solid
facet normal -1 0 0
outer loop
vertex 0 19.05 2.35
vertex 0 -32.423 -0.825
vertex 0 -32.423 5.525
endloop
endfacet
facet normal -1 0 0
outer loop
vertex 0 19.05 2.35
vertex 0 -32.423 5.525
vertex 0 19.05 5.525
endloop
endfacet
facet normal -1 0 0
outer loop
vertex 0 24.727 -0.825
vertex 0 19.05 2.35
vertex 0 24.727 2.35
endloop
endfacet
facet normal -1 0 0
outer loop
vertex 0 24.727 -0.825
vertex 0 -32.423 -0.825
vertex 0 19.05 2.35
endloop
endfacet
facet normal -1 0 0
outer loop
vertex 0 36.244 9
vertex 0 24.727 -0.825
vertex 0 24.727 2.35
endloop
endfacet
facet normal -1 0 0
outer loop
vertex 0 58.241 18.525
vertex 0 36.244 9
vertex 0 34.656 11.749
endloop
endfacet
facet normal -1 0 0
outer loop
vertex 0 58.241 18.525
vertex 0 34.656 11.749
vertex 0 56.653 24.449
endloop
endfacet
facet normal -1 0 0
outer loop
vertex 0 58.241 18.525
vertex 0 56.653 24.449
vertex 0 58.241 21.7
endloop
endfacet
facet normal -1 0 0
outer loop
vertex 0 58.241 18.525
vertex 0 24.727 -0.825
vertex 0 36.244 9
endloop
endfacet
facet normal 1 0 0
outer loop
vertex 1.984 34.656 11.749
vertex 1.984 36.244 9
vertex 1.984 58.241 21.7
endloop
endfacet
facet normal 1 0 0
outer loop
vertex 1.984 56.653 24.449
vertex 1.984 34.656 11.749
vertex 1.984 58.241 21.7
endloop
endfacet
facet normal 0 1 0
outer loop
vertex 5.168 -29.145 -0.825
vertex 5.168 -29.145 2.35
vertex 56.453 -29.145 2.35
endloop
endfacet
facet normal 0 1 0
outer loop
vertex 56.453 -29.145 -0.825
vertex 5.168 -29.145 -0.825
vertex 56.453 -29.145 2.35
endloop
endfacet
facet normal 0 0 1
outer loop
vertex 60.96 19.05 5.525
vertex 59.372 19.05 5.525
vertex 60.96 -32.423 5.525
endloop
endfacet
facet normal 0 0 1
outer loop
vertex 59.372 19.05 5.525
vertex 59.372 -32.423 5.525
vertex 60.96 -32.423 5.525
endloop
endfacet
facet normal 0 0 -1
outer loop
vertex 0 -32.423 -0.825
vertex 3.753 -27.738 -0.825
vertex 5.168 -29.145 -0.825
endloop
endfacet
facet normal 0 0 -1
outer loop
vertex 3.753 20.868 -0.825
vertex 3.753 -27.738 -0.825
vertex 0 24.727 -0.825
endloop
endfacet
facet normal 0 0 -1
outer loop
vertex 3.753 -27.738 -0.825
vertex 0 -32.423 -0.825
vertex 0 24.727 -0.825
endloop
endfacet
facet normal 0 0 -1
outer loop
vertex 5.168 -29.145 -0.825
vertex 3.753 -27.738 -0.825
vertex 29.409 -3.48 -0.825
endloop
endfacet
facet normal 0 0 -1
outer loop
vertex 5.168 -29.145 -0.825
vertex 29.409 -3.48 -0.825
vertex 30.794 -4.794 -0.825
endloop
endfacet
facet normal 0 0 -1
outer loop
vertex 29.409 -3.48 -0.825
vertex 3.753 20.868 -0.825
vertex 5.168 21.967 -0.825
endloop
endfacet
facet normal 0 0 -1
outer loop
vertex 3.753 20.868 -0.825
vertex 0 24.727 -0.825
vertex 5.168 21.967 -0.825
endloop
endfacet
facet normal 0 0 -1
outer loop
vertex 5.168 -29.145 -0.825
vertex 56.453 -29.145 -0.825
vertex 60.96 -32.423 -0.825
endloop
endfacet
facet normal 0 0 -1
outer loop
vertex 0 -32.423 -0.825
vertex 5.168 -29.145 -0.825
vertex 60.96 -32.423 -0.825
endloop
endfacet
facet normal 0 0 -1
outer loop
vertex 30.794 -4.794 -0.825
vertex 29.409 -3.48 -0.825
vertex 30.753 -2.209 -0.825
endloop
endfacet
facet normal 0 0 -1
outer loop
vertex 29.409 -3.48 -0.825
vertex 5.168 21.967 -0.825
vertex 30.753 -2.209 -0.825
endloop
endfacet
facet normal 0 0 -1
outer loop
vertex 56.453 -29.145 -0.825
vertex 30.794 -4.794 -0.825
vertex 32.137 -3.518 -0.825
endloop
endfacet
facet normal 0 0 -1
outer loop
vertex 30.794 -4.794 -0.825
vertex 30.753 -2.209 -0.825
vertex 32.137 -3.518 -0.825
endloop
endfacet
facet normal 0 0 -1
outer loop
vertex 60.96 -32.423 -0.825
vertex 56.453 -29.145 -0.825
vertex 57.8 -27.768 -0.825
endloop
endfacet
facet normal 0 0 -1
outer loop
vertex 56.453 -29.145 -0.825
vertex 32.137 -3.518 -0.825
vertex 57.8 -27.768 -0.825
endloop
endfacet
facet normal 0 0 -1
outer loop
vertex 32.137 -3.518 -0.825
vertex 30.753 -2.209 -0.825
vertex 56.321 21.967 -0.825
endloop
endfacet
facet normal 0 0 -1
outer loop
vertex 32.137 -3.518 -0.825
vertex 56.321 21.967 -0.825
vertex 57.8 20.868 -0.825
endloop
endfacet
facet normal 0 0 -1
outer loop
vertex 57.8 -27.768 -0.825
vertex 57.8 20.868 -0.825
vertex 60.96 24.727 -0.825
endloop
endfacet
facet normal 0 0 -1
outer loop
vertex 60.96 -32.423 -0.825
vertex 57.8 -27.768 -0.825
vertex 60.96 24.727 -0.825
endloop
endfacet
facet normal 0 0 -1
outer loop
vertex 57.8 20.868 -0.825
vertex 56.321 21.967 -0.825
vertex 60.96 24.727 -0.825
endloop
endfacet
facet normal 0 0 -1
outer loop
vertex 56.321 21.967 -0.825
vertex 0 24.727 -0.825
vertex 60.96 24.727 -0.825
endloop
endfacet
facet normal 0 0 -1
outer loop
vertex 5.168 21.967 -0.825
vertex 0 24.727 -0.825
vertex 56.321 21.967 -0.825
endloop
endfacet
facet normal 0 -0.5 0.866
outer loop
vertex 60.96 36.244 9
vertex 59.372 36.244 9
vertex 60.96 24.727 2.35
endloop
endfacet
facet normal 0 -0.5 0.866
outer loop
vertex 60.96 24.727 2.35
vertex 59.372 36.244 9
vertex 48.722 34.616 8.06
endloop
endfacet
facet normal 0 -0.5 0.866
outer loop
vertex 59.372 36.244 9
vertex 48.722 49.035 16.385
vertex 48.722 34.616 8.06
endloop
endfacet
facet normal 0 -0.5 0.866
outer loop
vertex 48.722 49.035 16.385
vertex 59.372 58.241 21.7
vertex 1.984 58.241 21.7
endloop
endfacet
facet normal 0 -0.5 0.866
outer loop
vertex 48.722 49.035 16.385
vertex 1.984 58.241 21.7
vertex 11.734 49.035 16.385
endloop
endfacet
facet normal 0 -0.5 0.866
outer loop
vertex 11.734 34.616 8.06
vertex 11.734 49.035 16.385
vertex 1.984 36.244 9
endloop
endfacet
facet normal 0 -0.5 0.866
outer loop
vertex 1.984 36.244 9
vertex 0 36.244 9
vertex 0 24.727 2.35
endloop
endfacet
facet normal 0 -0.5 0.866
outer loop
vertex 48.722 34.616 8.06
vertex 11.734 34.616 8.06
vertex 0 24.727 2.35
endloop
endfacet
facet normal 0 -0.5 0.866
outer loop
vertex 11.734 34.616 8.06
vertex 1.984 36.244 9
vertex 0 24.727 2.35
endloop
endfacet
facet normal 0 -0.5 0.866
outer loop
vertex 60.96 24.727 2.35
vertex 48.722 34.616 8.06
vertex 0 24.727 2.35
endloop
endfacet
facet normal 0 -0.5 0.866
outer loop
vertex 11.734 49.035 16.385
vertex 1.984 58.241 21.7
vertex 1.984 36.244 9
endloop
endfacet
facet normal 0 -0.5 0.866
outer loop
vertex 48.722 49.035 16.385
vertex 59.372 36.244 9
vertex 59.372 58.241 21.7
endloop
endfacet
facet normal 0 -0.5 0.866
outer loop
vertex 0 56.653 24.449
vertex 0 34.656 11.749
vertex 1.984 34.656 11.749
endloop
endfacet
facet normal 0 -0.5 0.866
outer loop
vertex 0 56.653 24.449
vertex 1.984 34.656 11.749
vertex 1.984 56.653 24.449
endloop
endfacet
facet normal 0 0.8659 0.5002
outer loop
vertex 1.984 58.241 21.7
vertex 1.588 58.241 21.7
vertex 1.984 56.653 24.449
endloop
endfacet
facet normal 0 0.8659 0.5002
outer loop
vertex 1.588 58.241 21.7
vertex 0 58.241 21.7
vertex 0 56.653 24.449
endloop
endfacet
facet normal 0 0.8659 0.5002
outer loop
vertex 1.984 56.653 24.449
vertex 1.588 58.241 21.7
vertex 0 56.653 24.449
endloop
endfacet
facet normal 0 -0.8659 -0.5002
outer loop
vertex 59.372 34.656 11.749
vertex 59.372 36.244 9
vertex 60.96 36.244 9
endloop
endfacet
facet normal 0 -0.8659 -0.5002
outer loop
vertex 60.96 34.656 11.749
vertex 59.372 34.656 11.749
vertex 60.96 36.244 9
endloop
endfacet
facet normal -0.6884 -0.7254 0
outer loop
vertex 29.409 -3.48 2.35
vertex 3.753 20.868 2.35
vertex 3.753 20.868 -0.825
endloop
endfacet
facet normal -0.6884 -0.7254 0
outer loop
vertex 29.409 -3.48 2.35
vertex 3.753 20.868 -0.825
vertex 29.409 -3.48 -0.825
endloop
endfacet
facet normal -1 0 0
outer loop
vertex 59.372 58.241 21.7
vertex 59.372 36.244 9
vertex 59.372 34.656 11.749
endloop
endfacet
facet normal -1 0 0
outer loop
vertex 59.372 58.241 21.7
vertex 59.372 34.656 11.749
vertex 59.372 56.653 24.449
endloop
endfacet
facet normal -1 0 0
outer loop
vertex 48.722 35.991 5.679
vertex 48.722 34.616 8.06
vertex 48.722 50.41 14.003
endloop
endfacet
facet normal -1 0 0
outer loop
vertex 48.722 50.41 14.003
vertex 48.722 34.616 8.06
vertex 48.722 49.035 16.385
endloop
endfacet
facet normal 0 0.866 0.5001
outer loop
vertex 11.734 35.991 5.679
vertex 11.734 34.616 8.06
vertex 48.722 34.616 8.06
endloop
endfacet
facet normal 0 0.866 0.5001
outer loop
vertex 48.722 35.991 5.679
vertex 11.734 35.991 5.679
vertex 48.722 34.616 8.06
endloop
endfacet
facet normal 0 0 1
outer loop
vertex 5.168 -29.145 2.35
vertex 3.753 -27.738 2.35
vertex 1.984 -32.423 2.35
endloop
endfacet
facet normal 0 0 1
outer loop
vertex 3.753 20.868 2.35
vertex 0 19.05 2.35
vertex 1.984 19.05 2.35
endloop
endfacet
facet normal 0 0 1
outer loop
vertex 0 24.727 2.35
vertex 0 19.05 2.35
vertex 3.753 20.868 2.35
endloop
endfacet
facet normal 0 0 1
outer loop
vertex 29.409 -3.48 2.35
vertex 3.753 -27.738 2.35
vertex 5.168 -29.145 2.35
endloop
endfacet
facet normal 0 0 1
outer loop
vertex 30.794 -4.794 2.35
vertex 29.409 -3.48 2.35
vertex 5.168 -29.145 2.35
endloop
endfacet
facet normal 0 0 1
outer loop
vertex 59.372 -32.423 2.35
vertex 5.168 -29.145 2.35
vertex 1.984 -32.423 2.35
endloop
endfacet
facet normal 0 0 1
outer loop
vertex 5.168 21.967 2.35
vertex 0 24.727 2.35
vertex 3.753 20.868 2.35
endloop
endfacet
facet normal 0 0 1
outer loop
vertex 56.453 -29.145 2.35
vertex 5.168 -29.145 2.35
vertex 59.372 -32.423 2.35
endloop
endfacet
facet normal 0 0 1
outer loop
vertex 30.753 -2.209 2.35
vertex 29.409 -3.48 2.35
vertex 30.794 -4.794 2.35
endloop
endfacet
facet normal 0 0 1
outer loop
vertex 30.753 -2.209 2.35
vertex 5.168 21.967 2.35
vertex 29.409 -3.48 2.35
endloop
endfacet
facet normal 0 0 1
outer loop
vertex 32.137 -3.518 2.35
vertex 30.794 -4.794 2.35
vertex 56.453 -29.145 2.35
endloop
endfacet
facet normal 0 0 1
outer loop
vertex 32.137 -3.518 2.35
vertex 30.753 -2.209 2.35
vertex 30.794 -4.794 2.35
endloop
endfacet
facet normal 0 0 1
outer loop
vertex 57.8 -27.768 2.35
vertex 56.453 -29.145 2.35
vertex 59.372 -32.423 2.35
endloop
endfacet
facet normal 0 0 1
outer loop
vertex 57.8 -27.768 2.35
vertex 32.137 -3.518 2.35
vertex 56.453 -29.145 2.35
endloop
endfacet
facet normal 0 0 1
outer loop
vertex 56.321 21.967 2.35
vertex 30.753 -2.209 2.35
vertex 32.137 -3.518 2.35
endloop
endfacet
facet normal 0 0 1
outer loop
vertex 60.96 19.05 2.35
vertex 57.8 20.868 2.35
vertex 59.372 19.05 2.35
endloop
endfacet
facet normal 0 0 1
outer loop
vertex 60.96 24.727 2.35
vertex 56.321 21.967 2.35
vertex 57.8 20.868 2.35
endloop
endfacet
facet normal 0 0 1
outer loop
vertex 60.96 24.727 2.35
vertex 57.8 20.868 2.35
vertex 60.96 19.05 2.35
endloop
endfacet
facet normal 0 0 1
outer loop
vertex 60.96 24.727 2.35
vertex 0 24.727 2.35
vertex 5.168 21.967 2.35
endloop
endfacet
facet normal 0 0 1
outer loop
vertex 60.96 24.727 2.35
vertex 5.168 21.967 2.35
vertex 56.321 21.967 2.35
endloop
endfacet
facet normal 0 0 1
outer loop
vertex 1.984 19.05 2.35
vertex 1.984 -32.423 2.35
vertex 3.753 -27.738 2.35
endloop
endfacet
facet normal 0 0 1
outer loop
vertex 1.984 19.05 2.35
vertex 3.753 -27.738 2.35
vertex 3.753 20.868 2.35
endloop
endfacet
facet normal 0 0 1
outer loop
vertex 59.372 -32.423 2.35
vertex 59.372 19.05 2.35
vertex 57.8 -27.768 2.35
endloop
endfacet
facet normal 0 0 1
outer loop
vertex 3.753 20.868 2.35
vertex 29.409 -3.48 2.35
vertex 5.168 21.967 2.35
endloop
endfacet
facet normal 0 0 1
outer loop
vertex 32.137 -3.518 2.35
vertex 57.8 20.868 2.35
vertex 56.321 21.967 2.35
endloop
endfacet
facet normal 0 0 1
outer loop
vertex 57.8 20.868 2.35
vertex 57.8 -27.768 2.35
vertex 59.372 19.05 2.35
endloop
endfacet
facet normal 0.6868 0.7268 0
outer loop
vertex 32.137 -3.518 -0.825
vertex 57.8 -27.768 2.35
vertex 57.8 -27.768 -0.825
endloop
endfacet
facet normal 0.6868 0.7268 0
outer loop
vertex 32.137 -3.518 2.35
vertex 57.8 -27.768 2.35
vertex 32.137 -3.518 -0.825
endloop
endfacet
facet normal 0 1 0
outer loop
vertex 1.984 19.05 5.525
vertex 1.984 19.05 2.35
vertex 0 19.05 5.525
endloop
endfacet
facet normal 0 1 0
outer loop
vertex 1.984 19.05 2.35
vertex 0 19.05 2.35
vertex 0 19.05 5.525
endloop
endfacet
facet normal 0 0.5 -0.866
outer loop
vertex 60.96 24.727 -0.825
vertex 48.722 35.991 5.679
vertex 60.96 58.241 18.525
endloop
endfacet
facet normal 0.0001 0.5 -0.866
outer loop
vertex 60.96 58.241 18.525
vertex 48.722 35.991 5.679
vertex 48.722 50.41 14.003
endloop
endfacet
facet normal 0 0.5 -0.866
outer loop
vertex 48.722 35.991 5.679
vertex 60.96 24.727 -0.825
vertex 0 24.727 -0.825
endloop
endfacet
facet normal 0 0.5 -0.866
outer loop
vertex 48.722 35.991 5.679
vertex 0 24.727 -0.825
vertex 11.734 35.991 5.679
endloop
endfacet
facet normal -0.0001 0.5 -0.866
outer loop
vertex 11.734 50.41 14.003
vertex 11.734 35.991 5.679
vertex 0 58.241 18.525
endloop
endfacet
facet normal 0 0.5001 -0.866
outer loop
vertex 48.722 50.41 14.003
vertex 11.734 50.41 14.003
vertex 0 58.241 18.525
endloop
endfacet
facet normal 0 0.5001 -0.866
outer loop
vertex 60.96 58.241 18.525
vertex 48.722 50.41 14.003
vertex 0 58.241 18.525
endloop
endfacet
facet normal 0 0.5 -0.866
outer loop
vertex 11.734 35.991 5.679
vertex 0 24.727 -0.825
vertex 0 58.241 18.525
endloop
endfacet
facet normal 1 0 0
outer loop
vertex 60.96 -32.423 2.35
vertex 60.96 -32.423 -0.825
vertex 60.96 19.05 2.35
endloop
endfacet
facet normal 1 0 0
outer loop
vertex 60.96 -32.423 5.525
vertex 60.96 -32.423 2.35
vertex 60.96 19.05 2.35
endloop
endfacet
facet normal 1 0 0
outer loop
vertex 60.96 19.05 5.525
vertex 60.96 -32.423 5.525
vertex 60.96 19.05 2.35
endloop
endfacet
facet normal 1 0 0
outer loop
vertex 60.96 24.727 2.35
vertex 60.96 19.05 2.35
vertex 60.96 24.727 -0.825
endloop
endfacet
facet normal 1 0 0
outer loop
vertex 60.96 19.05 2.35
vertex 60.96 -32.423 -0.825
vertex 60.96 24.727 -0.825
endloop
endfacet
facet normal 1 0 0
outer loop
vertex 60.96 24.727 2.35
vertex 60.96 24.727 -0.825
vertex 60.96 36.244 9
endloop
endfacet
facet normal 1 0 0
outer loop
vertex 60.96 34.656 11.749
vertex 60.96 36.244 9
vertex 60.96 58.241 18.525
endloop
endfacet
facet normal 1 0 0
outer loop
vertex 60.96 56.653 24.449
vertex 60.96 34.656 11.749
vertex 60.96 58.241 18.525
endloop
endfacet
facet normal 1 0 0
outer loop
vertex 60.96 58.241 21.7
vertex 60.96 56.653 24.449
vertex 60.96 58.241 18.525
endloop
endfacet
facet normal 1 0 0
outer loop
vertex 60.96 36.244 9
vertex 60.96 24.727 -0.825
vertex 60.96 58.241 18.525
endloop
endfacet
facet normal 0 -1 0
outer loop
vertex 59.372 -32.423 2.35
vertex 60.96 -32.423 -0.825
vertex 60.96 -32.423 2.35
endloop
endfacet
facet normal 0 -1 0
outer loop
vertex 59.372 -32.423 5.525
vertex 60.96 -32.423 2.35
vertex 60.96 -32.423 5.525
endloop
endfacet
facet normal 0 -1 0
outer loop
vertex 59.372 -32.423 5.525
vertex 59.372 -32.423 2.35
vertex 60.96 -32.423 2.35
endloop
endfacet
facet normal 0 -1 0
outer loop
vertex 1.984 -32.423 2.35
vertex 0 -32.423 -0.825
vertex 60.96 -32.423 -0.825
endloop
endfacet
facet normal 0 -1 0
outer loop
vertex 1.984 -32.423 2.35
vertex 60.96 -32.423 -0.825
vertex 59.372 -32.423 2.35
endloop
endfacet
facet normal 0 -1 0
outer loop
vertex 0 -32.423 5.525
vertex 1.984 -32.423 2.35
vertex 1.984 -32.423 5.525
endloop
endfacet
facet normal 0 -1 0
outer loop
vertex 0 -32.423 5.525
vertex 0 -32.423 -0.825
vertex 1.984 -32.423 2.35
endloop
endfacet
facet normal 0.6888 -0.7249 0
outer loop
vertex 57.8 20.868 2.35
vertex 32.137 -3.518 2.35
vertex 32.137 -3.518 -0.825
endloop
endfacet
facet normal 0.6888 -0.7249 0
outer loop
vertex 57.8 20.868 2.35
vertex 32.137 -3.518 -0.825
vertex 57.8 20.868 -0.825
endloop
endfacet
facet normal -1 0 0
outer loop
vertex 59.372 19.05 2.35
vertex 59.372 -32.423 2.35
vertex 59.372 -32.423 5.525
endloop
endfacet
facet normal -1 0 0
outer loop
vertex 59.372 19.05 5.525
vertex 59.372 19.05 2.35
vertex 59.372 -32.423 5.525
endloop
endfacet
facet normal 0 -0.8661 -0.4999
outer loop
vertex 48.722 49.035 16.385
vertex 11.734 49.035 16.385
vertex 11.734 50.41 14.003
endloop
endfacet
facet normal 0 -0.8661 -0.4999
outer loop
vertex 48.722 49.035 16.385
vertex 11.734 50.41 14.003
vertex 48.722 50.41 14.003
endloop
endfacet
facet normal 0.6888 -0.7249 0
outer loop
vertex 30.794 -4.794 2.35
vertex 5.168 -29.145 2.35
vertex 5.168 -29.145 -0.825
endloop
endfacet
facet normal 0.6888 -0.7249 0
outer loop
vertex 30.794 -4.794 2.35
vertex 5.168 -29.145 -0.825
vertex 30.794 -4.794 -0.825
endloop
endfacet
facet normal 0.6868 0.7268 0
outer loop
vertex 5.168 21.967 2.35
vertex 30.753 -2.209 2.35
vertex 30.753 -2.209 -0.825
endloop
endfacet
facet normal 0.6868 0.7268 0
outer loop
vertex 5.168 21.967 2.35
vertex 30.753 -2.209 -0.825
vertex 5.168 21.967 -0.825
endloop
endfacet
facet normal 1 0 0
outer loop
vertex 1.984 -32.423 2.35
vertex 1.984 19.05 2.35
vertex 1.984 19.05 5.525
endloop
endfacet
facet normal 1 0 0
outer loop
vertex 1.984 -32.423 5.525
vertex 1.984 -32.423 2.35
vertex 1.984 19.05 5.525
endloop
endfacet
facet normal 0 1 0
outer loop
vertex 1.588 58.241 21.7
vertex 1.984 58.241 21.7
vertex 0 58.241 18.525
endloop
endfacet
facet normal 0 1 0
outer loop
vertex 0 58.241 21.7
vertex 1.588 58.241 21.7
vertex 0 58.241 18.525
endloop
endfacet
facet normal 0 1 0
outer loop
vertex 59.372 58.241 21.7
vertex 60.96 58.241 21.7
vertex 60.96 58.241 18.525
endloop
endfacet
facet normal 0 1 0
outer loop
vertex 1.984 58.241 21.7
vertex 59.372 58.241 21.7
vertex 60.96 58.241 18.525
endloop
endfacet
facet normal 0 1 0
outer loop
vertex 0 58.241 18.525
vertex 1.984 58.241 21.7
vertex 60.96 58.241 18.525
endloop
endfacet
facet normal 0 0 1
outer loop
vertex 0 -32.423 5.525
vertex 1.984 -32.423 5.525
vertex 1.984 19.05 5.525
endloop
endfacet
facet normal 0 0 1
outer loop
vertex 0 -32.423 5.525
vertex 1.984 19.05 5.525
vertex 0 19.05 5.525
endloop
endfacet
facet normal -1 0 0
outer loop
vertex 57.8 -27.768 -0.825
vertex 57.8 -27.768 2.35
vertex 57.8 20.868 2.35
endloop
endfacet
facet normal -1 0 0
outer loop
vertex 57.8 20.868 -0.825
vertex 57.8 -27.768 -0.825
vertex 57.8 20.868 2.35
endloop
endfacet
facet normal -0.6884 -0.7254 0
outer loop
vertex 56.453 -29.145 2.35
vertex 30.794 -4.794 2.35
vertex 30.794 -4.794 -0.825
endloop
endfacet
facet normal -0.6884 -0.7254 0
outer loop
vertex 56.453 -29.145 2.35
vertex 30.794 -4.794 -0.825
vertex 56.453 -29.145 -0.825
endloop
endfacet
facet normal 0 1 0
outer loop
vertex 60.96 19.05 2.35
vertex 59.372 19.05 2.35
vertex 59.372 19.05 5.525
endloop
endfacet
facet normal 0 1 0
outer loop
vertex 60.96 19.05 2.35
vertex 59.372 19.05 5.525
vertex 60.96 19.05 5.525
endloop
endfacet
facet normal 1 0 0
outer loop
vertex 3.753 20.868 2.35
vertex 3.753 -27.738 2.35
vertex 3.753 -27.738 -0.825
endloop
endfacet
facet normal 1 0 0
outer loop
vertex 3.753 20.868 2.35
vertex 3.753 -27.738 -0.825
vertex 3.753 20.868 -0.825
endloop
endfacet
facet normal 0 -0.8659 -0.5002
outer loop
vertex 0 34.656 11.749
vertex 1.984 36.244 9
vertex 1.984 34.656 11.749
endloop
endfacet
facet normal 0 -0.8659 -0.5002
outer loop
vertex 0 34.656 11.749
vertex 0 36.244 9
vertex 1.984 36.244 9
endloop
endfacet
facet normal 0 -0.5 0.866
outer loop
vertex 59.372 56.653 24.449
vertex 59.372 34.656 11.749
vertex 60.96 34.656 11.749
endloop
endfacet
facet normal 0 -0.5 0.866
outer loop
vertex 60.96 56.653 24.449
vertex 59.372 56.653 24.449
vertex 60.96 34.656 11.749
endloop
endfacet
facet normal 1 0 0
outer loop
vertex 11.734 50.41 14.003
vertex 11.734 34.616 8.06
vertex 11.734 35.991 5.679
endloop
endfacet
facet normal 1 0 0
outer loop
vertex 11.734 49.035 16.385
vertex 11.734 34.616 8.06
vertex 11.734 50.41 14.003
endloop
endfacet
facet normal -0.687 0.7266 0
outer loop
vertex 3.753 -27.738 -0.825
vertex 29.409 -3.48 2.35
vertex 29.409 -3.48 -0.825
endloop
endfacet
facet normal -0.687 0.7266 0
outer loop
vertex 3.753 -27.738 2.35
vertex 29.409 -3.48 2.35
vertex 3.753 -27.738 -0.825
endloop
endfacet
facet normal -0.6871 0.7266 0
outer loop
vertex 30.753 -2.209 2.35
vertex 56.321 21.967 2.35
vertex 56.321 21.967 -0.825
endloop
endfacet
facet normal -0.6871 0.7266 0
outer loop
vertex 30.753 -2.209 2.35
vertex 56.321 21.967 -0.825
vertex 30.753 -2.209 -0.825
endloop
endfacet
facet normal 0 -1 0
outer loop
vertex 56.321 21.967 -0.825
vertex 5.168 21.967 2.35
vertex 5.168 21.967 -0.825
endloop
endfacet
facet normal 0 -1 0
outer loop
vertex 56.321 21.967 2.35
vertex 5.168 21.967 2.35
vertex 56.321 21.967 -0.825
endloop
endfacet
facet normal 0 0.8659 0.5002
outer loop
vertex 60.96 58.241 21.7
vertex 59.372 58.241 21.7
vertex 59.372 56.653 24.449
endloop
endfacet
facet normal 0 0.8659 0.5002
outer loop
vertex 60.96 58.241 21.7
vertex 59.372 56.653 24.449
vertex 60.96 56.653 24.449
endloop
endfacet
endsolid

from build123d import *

# Parameters (mm, degrees)
F1_DEPTH  = 60.96
F2_W      = 1.5875
F2_H      = 32.4230269723
F3_DEPTH  = 3.175
F4_W      = 1.5875
F4_H      = 32.4230269723
F5_DEPTH  = 3.175
F7_DEPTH  = 60.961
F8_W      = 54.0470709093
F8_H      = 51.1124171317
F9_DEPTH  = 3.176
F10_W     = 1.5875
F10_H     = 25.4
F11_DEPTH = 3.175
F12_W     = 1.5875
F12_H     = 25.4
F13_DEPTH = 3.175
F15_DEPTH = 3.175
F17_DEPTH = 3.175
F18_W     = 36.9880022481
F18_H     = 16.6493579745
F19_DEPTH = 19.5074859241
F20_DEPTH = 0.396875
F21_DEPTH = 0.396875
F22_DEPTH = 19.05
F23_DEPTH = 19.05


with BuildPart() as f1:
    # F0 (on Right) → F1 (new body)
    with BuildSketch(Plane.YZ):
        Polygon((-32.4230269723, -0.8245654169), (24.7269730277, -0.8245654169), (68.72106354, 24.5754345831), (68.72106354, 27.7504345831), (24.7269730277, 2.3504345831), (-32.4230269723, 2.3504345831), align=None)
    extrude(amount=F1_DEPTH)

    # F2 (on face) → F3 (join)
    with BuildSketch(Plane.XY.offset(2.3504345831)):
        with Locations((60.16625, -16.2115134861)):
            Rectangle(F2_W, F2_H)
    extrude(amount=F3_DEPTH)

    # F4 (on face) → F5 (join)
    with BuildSketch(Plane.XY.offset(2.3504345831)):
        with Locations((0.79375, -16.2115134861)):
            Rectangle(F4_W, F4_H)
    extrude(amount=F5_DEPTH)

    # F6 (on face) → F7 (cut, through all)
    with BuildSketch(Plane.YZ.offset(60.96)):
        Polygon((68.72106354, 27.7504345831), (58.240683562, 21.6995843816), (58.240683562, 18.5245843816), (68.72106354, 24.5754345831), align=None)
    extrude(amount=-F7_DEPTH, mode=Mode.SUBTRACT)

    # F8 (on face) → F9 (cut, through all)
    with BuildSketch(Plane.XY.offset(2.3504345831)):
        with Locations((30.776332831, -3.5890638828)):
            Rectangle(F8_W, F8_H)
    extrude(amount=-F9_DEPTH, mode=Mode.SUBTRACT)

    # F10 (on face) → F11 (join)
    with BuildSketch(Plane(origin=(0, 5.1639752275, -8.944267463), x_dir=(1, 0, 0), z_dir=(0, -0.5, 0.8660254038))):
        with Locations((60.16625, 48.5877036892)):
            Rectangle(F10_W, F10_H)
    extrude(amount=F11_DEPTH)

    # F12 (on face) → F13 (join)
    with BuildSketch(Plane(origin=(0, 5.1639752275, -8.944267463), x_dir=(1, 0, 0), z_dir=(0, -0.5, 0.8660254038))):
        with Locations((0.79375, 48.5877036892)):
            Rectangle(F12_W, F12_H)
    extrude(amount=F13_DEPTH)

    # F14 (on face) → F15 (join)
    with BuildSketch(Plane.XY.offset(2.3504345831)):
        Polygon((57.7998682857, -27.7678910643), (5.1683941856, 21.967144683), (3.7527973764, 21.967144683), (3.7527973764, 20.8684690297), (56.4532540739, -29.1452724487), (57.7998682857, -29.1452724487), align=None)
    extrude(amount=-F15_DEPTH)

    # F16 (on face) → F17 (join)
    with BuildSketch(Plane.XY.offset(2.3504345831)):
        Polygon((56.3214682043, 21.967144683), (3.7527973764, -27.7384221554), (3.7527973764, -29.1452724487), (5.1683941856, -29.1452724487), (57.7998682857, 20.8684690297), (57.7998682857, 21.967144683), align=None)
    extrude(amount=-F17_DEPTH)

    # F18 (on face) → F19 (cut, through all)
    with BuildSketch(Plane(origin=(0, 5.1639752275, -8.944267463), x_dir=(1, 0, 0), z_dir=(0, -0.5, 0.8660254038))):
        with Locations((30.2279754542, 42.3330701888)):
            Rectangle(F18_W, F18_H)
    extrude(amount=-F19_DEPTH, mode=Mode.SUBTRACT)

    # F20 (add): a face of the model
    f20_faces = [f1.faces().sort_by_distance(p)[0] for p in [
        (1.5875, 46.4484109339, 16.7243997101),
    ]]
    extrude(f20_faces, amount=F20_DEPTH)

    # F21 (add): a face of the model
    f21_faces = [f1.faces().sort_by_distance(p)[0] for p in [
        (1.5875, -16.2115134861, 3.9379345831),
    ]]
    extrude(f21_faces, amount=F21_DEPTH)

    # F22 (add): a face of the model
    f22_faces = [f1.faces().sort_by_distance(p)[0] for p in [
        (0.9921875, 0, 3.9379345831),
    ]]
    extrude(f22_faces, amount=F22_DEPTH)

    # F23 (add): a face of the model
    f23_faces = [f1.faces().sort_by_distance(p)[0] for p in [
        (60.16625, 0, 3.9379345831),
    ]]
    extrude(f23_faces, amount=F23_DEPTH)


solid = f1.part
